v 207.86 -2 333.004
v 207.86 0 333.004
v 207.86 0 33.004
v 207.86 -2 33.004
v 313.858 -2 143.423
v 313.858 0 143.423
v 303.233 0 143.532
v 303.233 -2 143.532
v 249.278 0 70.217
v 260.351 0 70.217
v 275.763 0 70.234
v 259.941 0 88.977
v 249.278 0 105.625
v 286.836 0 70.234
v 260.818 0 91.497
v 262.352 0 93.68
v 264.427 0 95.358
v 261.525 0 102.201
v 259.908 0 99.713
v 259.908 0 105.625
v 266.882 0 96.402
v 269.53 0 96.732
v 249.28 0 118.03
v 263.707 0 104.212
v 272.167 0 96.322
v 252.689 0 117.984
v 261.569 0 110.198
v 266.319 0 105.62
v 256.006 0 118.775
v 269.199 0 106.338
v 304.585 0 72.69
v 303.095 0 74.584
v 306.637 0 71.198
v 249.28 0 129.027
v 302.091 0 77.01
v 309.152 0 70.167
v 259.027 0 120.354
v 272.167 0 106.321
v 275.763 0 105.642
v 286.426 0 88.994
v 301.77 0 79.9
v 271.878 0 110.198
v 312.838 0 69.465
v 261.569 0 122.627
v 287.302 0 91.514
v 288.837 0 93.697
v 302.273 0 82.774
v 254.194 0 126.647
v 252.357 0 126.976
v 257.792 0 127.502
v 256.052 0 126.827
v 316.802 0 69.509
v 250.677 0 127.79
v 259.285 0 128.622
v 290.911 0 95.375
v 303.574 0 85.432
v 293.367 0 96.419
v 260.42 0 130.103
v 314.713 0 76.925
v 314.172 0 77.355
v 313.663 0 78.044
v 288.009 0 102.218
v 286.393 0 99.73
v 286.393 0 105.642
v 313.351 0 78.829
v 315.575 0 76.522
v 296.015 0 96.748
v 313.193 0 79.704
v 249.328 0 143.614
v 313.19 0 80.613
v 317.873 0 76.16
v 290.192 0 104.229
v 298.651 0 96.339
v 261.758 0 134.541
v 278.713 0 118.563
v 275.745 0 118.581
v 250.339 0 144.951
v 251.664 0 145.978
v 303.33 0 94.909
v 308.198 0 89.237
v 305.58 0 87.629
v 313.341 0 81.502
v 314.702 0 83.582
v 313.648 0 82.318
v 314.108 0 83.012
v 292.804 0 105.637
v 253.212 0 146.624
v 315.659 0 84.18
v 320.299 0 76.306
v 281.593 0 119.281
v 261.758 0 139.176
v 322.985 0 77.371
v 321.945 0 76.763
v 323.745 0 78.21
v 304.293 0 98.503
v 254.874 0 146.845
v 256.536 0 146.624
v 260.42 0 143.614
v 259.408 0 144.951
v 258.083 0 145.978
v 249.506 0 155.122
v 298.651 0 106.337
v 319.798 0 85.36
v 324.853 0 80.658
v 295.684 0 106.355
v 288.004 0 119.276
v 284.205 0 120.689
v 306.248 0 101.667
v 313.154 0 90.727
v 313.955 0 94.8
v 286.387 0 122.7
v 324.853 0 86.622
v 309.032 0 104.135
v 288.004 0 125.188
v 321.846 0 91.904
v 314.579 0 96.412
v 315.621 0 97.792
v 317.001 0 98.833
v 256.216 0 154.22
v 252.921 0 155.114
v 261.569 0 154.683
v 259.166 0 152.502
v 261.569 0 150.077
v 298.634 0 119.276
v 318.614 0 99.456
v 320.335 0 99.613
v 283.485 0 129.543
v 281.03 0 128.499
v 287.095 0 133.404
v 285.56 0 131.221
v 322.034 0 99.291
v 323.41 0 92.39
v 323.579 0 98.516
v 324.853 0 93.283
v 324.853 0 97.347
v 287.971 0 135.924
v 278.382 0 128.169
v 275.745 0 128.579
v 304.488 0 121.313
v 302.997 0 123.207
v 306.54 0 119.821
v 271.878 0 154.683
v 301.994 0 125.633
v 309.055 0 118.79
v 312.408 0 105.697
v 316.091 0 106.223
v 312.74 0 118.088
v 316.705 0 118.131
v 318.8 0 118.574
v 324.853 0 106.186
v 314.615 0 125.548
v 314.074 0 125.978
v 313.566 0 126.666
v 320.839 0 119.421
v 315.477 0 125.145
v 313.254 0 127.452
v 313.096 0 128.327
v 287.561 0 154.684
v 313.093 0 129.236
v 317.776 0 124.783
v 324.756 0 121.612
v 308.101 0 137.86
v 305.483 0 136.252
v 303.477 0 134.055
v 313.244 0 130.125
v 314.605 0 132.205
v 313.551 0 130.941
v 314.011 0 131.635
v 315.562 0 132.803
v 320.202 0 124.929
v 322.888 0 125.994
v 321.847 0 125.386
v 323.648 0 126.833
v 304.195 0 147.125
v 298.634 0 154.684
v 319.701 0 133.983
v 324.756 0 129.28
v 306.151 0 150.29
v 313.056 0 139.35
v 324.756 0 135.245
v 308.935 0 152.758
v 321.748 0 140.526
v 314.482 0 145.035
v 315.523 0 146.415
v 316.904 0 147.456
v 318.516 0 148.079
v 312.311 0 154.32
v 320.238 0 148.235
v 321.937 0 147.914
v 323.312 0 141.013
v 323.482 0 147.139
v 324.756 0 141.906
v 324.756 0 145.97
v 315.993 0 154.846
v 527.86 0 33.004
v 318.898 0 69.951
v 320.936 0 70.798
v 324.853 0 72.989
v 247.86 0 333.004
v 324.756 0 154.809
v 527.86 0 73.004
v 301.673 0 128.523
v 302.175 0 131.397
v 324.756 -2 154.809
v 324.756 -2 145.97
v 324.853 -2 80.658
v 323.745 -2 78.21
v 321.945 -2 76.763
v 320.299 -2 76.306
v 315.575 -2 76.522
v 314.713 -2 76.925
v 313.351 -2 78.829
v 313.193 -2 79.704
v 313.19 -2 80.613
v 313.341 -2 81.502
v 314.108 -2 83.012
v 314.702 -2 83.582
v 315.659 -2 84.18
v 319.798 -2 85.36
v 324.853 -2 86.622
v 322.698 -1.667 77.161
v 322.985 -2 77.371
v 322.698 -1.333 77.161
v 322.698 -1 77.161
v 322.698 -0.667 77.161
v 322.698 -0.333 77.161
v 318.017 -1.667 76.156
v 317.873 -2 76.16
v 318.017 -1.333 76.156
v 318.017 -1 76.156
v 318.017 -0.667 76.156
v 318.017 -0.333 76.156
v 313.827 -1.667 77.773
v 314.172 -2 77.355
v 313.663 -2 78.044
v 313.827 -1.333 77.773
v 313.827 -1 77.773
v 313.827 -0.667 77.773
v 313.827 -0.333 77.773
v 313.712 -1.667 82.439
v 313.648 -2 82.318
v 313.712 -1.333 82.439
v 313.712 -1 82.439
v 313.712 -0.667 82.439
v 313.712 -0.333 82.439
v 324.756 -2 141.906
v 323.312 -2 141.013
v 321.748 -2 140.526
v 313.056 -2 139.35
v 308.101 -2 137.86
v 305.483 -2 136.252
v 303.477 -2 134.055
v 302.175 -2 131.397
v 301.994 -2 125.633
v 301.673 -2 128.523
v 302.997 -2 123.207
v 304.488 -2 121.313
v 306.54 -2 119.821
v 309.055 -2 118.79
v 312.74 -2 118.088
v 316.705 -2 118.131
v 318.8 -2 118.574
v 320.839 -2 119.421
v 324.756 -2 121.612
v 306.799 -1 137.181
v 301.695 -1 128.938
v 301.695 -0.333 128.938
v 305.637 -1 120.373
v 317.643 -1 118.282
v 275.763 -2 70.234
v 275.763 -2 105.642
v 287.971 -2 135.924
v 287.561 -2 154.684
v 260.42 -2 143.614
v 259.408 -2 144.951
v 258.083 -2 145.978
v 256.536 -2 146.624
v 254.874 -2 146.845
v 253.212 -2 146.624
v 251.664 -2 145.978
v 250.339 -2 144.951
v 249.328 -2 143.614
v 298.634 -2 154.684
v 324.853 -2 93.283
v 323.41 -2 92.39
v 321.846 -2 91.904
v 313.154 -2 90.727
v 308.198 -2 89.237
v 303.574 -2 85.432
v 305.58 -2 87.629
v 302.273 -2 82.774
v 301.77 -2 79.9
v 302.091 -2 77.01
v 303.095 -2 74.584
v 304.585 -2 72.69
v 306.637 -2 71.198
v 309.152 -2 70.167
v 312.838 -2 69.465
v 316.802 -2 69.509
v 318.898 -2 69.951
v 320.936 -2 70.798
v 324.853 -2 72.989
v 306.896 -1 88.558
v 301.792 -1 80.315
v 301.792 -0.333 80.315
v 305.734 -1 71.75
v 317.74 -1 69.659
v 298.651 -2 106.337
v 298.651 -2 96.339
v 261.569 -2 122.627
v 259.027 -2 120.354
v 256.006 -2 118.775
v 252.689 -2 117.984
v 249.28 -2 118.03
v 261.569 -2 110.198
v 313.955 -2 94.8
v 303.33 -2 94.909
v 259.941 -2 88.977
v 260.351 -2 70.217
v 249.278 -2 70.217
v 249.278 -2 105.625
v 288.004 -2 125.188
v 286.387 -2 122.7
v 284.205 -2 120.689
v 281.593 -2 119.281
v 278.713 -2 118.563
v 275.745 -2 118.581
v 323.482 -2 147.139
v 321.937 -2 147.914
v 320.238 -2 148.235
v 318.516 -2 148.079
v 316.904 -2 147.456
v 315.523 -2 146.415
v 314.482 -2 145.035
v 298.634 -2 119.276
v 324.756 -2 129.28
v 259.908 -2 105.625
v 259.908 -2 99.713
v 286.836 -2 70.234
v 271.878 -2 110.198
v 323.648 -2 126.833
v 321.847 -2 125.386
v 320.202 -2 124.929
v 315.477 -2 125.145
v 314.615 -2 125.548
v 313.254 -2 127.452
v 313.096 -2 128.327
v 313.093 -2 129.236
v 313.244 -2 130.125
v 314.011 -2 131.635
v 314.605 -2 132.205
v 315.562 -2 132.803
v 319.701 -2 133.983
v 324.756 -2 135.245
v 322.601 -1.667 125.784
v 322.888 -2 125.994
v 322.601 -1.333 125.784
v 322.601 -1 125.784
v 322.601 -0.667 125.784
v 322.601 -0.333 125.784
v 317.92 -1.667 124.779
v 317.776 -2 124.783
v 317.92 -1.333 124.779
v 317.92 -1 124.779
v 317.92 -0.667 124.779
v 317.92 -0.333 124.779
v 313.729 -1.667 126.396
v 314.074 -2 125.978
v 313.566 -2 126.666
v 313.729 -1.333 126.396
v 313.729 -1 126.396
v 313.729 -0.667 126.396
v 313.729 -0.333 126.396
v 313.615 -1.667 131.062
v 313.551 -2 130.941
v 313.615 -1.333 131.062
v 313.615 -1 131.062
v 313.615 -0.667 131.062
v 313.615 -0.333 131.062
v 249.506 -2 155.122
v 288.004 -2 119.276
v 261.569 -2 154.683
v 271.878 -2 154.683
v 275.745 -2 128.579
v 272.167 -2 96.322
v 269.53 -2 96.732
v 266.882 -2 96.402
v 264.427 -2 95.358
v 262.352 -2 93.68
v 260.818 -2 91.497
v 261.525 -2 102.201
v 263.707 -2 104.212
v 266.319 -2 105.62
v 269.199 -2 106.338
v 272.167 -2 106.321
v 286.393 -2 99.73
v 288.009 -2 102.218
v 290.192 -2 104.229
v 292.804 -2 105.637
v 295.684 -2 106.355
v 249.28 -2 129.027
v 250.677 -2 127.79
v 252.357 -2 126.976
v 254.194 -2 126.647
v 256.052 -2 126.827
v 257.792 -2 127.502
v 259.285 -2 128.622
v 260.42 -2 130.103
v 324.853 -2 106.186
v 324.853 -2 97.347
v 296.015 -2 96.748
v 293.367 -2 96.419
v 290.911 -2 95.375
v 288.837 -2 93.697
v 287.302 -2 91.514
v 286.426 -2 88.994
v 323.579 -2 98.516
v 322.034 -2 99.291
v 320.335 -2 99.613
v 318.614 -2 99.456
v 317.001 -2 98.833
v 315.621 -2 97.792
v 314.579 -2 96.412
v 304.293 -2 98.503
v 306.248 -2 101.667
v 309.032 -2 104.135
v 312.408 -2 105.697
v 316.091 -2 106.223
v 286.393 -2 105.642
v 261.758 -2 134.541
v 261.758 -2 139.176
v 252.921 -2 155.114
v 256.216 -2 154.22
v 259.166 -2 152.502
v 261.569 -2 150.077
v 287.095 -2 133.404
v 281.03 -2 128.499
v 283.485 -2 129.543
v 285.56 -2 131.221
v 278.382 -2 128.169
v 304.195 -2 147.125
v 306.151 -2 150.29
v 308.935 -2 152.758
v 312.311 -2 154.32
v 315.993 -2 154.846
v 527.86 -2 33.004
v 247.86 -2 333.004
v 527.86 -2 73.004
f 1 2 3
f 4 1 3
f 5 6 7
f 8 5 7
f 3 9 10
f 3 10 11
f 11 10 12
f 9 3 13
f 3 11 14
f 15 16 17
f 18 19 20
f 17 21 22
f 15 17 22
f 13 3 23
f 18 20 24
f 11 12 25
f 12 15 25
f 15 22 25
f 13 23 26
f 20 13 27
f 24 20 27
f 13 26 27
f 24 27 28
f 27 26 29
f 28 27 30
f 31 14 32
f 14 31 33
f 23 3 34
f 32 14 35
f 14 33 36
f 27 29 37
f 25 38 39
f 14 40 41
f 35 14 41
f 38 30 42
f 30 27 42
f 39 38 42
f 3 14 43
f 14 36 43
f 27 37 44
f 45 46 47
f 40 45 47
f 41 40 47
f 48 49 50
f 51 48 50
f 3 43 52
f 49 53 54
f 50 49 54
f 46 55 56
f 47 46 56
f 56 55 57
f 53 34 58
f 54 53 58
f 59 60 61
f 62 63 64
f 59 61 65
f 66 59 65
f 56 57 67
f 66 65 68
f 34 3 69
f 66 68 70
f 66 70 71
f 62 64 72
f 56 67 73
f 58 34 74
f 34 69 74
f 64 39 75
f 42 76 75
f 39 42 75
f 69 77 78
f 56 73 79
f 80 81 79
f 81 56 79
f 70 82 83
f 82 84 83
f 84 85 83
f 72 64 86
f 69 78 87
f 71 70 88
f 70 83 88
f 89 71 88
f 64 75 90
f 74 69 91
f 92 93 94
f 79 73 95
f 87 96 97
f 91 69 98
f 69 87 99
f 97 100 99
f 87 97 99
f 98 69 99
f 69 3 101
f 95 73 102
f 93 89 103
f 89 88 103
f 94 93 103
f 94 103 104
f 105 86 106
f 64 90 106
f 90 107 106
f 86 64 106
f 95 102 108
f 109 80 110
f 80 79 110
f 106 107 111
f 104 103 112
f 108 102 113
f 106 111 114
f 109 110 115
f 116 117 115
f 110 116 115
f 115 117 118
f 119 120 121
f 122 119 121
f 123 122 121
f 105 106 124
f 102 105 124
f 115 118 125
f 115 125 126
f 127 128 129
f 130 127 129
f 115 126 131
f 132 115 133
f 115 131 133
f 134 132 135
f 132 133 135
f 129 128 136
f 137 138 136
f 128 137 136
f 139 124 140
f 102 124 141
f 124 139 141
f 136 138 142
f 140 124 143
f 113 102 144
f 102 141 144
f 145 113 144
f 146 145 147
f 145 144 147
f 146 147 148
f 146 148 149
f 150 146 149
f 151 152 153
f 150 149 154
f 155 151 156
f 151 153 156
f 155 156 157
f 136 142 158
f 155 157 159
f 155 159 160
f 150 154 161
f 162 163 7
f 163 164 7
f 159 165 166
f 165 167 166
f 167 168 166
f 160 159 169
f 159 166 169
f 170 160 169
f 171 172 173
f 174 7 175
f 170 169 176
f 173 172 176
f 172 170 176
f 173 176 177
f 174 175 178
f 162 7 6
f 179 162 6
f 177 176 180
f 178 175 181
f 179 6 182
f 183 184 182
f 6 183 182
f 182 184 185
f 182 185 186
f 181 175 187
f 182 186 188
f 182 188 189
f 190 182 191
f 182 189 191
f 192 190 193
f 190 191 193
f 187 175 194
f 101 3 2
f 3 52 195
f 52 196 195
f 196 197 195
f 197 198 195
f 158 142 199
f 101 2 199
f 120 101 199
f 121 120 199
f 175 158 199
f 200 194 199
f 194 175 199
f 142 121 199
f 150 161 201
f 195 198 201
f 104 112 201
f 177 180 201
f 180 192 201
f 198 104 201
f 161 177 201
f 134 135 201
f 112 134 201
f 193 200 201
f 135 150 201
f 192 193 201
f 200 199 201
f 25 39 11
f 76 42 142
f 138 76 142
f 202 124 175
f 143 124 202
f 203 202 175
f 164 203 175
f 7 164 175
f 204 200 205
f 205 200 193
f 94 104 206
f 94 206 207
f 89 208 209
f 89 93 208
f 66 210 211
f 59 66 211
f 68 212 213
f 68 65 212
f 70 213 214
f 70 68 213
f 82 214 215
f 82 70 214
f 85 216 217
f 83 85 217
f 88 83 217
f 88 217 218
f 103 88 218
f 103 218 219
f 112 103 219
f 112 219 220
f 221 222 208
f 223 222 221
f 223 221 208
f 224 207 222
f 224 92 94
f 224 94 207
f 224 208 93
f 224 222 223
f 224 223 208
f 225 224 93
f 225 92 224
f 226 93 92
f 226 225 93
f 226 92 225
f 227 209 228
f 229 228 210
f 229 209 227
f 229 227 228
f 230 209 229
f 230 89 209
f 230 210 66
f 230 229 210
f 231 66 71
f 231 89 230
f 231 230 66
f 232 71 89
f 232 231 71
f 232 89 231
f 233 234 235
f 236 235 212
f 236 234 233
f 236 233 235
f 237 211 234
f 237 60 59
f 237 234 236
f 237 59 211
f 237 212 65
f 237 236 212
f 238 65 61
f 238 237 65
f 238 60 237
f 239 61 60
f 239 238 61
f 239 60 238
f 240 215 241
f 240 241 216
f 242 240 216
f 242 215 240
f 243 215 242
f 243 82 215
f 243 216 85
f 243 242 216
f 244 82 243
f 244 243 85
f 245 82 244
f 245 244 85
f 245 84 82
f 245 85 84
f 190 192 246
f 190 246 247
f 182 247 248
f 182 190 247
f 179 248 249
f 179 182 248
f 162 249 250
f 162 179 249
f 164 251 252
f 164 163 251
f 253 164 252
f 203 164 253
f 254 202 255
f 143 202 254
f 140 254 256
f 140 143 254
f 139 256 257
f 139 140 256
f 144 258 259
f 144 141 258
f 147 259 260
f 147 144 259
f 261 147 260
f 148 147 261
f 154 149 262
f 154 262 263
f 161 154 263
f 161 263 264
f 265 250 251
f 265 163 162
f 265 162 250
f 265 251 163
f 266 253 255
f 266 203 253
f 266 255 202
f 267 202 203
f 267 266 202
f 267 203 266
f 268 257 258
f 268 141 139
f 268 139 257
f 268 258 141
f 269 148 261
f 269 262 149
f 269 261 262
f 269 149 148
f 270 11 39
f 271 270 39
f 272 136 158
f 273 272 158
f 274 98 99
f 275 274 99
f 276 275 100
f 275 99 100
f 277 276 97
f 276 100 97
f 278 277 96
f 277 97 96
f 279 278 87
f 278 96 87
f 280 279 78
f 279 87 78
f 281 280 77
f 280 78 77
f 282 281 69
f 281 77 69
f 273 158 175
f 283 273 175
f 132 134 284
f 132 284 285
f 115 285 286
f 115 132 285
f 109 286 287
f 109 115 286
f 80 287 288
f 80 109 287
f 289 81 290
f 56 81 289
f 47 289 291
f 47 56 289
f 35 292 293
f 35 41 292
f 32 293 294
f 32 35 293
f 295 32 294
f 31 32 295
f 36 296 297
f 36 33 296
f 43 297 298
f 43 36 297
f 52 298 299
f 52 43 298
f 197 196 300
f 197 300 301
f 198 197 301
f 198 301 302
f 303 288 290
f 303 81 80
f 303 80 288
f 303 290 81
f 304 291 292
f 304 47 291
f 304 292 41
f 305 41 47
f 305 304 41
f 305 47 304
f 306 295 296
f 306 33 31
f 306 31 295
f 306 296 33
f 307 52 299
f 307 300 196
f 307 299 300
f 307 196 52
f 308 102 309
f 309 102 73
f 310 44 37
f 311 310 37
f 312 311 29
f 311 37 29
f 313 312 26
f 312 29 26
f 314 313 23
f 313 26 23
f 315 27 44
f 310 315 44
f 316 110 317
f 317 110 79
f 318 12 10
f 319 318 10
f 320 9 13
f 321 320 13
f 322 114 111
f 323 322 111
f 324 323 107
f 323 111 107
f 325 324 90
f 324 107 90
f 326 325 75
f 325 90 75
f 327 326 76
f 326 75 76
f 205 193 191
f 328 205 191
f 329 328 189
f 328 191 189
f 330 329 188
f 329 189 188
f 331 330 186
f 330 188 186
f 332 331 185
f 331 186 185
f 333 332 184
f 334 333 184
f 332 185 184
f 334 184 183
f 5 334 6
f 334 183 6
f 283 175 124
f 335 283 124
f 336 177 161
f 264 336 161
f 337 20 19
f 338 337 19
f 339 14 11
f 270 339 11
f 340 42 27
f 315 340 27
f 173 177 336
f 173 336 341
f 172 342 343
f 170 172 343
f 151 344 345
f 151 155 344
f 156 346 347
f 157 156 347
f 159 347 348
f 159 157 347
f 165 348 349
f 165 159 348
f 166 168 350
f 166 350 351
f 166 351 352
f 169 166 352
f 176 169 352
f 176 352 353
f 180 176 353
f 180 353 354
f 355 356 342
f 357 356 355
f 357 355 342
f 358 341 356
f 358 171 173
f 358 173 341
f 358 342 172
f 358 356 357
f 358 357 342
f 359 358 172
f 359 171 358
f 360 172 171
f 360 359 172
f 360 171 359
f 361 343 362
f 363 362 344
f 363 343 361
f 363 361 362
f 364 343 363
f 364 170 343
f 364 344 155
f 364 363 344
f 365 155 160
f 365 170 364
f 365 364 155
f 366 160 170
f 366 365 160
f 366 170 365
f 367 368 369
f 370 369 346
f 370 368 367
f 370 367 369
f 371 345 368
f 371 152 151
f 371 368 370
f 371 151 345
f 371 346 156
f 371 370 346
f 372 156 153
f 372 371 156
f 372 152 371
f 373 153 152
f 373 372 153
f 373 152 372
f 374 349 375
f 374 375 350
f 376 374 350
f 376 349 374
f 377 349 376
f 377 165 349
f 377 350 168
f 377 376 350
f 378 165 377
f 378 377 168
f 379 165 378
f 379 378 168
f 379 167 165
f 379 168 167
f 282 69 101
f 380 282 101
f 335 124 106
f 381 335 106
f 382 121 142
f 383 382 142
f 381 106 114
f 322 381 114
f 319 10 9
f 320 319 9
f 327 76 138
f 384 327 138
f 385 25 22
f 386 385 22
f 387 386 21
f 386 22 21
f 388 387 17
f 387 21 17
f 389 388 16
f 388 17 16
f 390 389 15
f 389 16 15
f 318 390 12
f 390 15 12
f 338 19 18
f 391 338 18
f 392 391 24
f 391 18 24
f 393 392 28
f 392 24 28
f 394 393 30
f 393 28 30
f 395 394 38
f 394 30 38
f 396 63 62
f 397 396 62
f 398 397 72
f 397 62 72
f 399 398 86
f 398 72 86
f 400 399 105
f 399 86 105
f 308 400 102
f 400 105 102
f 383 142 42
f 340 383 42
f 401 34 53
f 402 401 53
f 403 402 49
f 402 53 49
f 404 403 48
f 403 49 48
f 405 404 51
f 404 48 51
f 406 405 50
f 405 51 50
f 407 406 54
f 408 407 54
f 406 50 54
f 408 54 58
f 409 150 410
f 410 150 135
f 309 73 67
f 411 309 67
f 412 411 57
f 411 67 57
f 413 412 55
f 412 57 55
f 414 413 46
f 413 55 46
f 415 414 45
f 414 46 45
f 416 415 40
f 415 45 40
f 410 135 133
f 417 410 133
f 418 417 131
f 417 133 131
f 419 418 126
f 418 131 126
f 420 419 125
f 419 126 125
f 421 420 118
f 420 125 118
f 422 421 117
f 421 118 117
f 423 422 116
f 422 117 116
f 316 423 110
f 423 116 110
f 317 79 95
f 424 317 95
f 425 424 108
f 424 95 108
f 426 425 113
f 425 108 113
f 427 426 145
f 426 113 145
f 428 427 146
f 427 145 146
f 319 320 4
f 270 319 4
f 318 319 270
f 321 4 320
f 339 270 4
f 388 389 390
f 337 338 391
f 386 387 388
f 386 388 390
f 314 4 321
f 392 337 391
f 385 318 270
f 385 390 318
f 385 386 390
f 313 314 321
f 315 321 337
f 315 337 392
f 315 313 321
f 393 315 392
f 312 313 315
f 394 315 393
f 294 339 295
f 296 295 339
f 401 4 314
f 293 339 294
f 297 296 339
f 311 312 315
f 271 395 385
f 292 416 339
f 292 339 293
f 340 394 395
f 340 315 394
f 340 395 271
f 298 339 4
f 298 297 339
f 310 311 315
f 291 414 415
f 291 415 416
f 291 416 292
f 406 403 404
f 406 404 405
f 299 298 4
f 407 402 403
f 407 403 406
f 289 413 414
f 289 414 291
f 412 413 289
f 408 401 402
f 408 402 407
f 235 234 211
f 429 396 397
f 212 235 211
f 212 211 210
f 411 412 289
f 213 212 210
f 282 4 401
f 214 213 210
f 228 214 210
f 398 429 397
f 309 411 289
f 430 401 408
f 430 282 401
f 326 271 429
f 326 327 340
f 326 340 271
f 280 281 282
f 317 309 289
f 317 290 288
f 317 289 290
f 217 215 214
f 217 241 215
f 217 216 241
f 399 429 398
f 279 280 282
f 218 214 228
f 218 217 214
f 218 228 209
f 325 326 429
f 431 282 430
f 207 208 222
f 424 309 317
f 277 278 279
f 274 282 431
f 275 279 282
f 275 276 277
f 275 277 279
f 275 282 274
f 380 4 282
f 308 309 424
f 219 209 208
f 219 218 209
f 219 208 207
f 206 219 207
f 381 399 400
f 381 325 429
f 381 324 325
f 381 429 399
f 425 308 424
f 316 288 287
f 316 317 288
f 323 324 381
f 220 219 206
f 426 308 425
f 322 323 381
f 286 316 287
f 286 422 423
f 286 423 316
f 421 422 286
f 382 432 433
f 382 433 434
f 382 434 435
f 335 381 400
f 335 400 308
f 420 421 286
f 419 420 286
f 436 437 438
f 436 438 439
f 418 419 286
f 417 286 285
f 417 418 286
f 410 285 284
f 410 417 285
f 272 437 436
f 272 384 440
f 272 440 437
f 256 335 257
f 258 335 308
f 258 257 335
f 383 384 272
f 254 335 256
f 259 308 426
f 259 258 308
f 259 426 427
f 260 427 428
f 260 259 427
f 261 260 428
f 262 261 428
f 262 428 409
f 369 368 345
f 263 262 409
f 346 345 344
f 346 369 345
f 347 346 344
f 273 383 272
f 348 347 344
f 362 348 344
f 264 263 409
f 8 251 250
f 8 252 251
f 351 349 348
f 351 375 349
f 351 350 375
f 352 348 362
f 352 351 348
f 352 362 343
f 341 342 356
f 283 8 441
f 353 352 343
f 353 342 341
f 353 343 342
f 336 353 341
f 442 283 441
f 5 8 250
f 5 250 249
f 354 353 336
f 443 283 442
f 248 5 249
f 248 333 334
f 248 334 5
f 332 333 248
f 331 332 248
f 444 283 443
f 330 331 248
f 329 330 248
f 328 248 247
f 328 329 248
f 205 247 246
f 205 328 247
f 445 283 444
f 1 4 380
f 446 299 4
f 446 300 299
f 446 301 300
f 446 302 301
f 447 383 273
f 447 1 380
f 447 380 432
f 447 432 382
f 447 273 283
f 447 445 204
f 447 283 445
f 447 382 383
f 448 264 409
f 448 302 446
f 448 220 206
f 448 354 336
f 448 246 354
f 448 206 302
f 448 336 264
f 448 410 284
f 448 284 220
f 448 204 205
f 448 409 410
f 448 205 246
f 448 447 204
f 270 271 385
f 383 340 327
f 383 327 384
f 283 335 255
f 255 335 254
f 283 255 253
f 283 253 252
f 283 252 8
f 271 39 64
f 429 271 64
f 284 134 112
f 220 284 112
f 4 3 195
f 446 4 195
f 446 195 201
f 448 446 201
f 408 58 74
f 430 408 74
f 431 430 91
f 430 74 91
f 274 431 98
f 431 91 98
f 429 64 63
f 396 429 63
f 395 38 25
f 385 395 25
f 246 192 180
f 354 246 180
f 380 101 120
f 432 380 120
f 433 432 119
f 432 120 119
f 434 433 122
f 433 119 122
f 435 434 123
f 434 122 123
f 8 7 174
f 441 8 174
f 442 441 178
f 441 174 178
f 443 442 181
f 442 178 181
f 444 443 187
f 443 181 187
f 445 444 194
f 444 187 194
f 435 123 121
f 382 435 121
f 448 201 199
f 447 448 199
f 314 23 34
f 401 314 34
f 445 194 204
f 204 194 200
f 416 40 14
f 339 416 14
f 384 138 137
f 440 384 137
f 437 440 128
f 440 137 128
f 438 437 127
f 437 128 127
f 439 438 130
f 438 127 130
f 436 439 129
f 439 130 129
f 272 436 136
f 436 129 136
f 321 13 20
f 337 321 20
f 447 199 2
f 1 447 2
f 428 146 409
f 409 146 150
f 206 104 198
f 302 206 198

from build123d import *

# Parameters (mm, degrees)
F1_DEPTH = 2


with BuildPart() as f1:
    # F0 (on Front) → F1 (new body)
    with BuildSketch(Plane.XZ):
        Polygon((207.8597095609, 332.3038927495), (207.8597095609, 33.0038927495), (527.8597095609, 33.0038927495), (527.8597095609, 73.0038927495), (247.8597095609, 333.0038927495), (207.8597095609, 333.0038927495), align=None)
        with BuildLine():
            Line((260.350984643, 70.2171021446), (249.2783638935, 70.2171021446))
            Line((249.2783638935, 70.2171021446), (249.2783638935, 105.6249880537))
            Line((249.2783638935, 105.6249880537), (259.907719801, 105.6249880537))
            Line((259.907719801, 105.6249880537), (259.907719801, 99.7129225477))
            ThreePointArc((259.907719801, 99.7129225477), (264.969159541, 104.9981198242), (272.166569839, 106.3205295548))
            Line((272.166569839, 106.3205295548), (272.166569839, 96.3221633181))
            ThreePointArc((272.166569839, 96.3221633181), (264.4266251898, 95.3581367621), (259.9412812379, 88.9770882584))
            Line((259.9412812379, 88.9770882584), (260.350984643, 70.2171021446))
        make_face(mode=Mode.SUBTRACT)
        with BuildLine():
            ThreePointArc((286.3925668235, 99.7295484954), (291.4540065635, 105.0147457719), (298.6514168615, 106.3371555025))
            Line((298.6514168615, 106.3371555025), (298.6514168615, 96.3387892658))
            ThreePointArc((298.6514168615, 96.3387892658), (290.9114722123, 95.3747627098), (286.4261282604, 88.9937142061))
            Line((286.4261282604, 88.9937142061), (286.8358316655, 70.2337280923))
            Line((286.8358316655, 70.2337280923), (275.763210916, 70.2337280923))
            Line((275.763210916, 70.2337280923), (275.763210916, 105.6416140014))
            Line((275.763210916, 105.6416140014), (286.3925668235, 105.6416140014))
            Line((286.3925668235, 105.6416140014), (286.3925668235, 99.7295484954))
        make_face(mode=Mode.SUBTRACT)
        with BuildLine():
            Line((324.8531874271, 80.6576142285), (324.8531874271, 72.9894021723))
            add(Edge.make_bspline(
                [(324.8531874271, 93.2830700848), (323.3065188743, 92.0353198263), (319.5932504041, 91.5074140824), (305.76812214, 90.3356227603), (300.2660508817, 80.3600298922), (304.3588181672, 69.9638702682), (318.5536418728, 68.5542730887), (322.0696986329, 71.5322612124), (324.8531874271, 72.9894021723)],
                knots=[0, 0, 0, 0, 0.1282549597, 0.3235779421, 0.4933166916, 0.6588260023, 0.8480719548, 1, 1, 1, 1], degree=3))
            Line((324.8531874271, 93.2830700848), (324.8531874271, 86.6217890952))
            add(Edge.make_bspline(
                [(324.8531874271, 80.6576142285), (324.3853881763, 79.3716732666), (323.4463072091, 76.6838402752), (318.0274043762, 75.8320101397), (313.0517233961, 76.8842047893), (312.8862075691, 83.1667071186), (318.065998571, 85.3140545113), (321.9671157982, 85.6164060676), (324.8531874271, 86.6217890952)],
                knots=[0, 0, 0, 0, 0.1467139352, 0.3148344078, 0.4723324727, 0.6349882053, 0.7976765175, 1, 1, 1, 1], degree=3))
        make_face(mode=Mode.SUBTRACT)
        with BuildLine():
            Line((316.0905669231, 106.2228459891), (324.8531874271, 106.1858685351))
            Line((324.8531874271, 106.1858685351), (324.8531874271, 97.3470781765))
            ThreePointArc((324.8531874271, 97.3470781765), (318.6136208517, 99.4559091904), (313.9553243844, 94.7997698758))
            Line((313.9553243844, 94.7997698758), (303.3299023836, 94.9093083117))
            ThreePointArc((303.3299023836, 94.9093083117), (307.550022404, 103.002604489), (316.0905669231, 106.2228459891))
        make_face(mode=Mode.SUBTRACT)
        with BuildLine():
            Line((271.8778838503, 154.6828896542), (271.8778838503, 110.1980508108))
            Line((271.8778838503, 110.1980508108), (261.5694468009, 110.1980508108))
            Line((261.5694468009, 110.1980508108), (261.5694468009, 122.6266548772))
            ThreePointArc((261.5694468009, 122.6266548772), (256.0058228238, 118.7745070428), (249.2798035133, 118.0304513116))
            Line((249.2798035133, 118.0304513116), (249.2798035133, 129.026845171))
            ThreePointArc((249.2798035133, 129.026845171), (255.1291713772, 126.67333299), (260.419606148, 130.1034093638))
            ThreePointArc((260.419606148, 130.1034093638), (261.9283811203, 136.8586272736), (260.419606148, 143.6138451834))
            ThreePointArc((260.419606148, 143.6138451834), (254.8736584473, 146.8446188485), (249.3277107465, 143.6138451834))
            Line((249.3277107465, 143.6138451834), (249.5063905704, 155.1215500374))
            ThreePointArc((249.5063905704, 155.1215500374), (256.2156097253, 154.2198410632), (261.5694468009, 150.0770003338))
            Line((261.5694468009, 150.0770003338), (261.5694468009, 154.6828896542))
            Line((261.5694468009, 154.6828896542), (271.8778838503, 154.6828896542))
        make_face(mode=Mode.SUBTRACT)
        with BuildLine():
            Line((298.6336936343, 119.2762107392), (288.0043377268, 119.2762107392))
            Line((288.0043377268, 119.2762107392), (288.0043377268, 125.1882762452))
            ThreePointArc((288.0043377268, 125.1882762452), (282.9428979868, 119.9030789686), (275.7454876888, 118.5806692381))
            Line((275.7454876888, 118.5806692381), (275.7454876888, 128.5790354748))
            ThreePointArc((275.7454876888, 128.5790354748), (283.485432338, 129.5430620307), (287.9707762899, 135.9241105345))
            Line((287.9707762899, 135.9241105345), (287.5610728848, 154.6840966483))
            Line((287.5610728848, 154.6840966483), (298.6336936343, 154.6840966483))
            Line((298.6336936343, 154.6840966483), (298.6336936343, 119.2762107392))
        make_face(mode=Mode.SUBTRACT)
        with BuildLine():
            add(Edge.make_bspline(
                [(324.7558644524, 141.9059485932), (323.2091958996, 140.6581983347), (319.4959274294, 140.1302925908), (305.6707991653, 138.9585012686), (300.168727907, 128.9829084005), (304.2614951926, 118.5867487766), (318.4563188981, 117.1771515971), (321.9723756583, 120.1551397208), (324.7558644524, 121.6122806807)],
                knots=[0, 0, 0, 0, 0.1282549597, 0.3235779421, 0.4933166916, 0.6588260023, 0.8480719548, 1, 1, 1, 1], degree=3))
            Line((324.7558644524, 141.9059485932), (324.7558644524, 135.2446676035))
            add(Edge.make_bspline(
                [(324.7558644524, 129.2804927369), (324.2880652016, 127.9945517749), (323.3489842345, 125.3067187836), (317.9300814016, 124.4548886481), (312.9544004215, 125.5070832977), (312.7888845944, 131.7895856269), (317.9686755963, 133.9369330196), (321.8697928236, 134.239284576), (324.7558644524, 135.2446676035)],
                knots=[0, 0, 0, 0, 0.1467139352, 0.3148344078, 0.4723324727, 0.6349882053, 0.7976765175, 1, 1, 1, 1], degree=3))
            Line((324.7558644524, 129.2804927369), (324.7558644524, 121.6122806807))
        make_face(mode=Mode.SUBTRACT)
        with BuildLine():
            Line((324.7558644524, 154.8087470435), (324.7558644524, 145.9699566849))
            ThreePointArc((324.7558644524, 145.9699566849), (318.516297877, 148.0787876987), (313.8580014098, 143.4226483841))
            Line((313.8580014098, 143.4226483841), (303.2325794089, 143.5321868201))
            ThreePointArc((303.2325794089, 143.5321868201), (307.4526994293, 151.6254829974), (315.9932439484, 154.8457244975))
            Line((315.9932439484, 154.8457244975), (324.7558644524, 154.8087470435))
        make_face(mode=Mode.SUBTRACT)
    extrude(amount=F1_DEPTH)


solid = f1.part
